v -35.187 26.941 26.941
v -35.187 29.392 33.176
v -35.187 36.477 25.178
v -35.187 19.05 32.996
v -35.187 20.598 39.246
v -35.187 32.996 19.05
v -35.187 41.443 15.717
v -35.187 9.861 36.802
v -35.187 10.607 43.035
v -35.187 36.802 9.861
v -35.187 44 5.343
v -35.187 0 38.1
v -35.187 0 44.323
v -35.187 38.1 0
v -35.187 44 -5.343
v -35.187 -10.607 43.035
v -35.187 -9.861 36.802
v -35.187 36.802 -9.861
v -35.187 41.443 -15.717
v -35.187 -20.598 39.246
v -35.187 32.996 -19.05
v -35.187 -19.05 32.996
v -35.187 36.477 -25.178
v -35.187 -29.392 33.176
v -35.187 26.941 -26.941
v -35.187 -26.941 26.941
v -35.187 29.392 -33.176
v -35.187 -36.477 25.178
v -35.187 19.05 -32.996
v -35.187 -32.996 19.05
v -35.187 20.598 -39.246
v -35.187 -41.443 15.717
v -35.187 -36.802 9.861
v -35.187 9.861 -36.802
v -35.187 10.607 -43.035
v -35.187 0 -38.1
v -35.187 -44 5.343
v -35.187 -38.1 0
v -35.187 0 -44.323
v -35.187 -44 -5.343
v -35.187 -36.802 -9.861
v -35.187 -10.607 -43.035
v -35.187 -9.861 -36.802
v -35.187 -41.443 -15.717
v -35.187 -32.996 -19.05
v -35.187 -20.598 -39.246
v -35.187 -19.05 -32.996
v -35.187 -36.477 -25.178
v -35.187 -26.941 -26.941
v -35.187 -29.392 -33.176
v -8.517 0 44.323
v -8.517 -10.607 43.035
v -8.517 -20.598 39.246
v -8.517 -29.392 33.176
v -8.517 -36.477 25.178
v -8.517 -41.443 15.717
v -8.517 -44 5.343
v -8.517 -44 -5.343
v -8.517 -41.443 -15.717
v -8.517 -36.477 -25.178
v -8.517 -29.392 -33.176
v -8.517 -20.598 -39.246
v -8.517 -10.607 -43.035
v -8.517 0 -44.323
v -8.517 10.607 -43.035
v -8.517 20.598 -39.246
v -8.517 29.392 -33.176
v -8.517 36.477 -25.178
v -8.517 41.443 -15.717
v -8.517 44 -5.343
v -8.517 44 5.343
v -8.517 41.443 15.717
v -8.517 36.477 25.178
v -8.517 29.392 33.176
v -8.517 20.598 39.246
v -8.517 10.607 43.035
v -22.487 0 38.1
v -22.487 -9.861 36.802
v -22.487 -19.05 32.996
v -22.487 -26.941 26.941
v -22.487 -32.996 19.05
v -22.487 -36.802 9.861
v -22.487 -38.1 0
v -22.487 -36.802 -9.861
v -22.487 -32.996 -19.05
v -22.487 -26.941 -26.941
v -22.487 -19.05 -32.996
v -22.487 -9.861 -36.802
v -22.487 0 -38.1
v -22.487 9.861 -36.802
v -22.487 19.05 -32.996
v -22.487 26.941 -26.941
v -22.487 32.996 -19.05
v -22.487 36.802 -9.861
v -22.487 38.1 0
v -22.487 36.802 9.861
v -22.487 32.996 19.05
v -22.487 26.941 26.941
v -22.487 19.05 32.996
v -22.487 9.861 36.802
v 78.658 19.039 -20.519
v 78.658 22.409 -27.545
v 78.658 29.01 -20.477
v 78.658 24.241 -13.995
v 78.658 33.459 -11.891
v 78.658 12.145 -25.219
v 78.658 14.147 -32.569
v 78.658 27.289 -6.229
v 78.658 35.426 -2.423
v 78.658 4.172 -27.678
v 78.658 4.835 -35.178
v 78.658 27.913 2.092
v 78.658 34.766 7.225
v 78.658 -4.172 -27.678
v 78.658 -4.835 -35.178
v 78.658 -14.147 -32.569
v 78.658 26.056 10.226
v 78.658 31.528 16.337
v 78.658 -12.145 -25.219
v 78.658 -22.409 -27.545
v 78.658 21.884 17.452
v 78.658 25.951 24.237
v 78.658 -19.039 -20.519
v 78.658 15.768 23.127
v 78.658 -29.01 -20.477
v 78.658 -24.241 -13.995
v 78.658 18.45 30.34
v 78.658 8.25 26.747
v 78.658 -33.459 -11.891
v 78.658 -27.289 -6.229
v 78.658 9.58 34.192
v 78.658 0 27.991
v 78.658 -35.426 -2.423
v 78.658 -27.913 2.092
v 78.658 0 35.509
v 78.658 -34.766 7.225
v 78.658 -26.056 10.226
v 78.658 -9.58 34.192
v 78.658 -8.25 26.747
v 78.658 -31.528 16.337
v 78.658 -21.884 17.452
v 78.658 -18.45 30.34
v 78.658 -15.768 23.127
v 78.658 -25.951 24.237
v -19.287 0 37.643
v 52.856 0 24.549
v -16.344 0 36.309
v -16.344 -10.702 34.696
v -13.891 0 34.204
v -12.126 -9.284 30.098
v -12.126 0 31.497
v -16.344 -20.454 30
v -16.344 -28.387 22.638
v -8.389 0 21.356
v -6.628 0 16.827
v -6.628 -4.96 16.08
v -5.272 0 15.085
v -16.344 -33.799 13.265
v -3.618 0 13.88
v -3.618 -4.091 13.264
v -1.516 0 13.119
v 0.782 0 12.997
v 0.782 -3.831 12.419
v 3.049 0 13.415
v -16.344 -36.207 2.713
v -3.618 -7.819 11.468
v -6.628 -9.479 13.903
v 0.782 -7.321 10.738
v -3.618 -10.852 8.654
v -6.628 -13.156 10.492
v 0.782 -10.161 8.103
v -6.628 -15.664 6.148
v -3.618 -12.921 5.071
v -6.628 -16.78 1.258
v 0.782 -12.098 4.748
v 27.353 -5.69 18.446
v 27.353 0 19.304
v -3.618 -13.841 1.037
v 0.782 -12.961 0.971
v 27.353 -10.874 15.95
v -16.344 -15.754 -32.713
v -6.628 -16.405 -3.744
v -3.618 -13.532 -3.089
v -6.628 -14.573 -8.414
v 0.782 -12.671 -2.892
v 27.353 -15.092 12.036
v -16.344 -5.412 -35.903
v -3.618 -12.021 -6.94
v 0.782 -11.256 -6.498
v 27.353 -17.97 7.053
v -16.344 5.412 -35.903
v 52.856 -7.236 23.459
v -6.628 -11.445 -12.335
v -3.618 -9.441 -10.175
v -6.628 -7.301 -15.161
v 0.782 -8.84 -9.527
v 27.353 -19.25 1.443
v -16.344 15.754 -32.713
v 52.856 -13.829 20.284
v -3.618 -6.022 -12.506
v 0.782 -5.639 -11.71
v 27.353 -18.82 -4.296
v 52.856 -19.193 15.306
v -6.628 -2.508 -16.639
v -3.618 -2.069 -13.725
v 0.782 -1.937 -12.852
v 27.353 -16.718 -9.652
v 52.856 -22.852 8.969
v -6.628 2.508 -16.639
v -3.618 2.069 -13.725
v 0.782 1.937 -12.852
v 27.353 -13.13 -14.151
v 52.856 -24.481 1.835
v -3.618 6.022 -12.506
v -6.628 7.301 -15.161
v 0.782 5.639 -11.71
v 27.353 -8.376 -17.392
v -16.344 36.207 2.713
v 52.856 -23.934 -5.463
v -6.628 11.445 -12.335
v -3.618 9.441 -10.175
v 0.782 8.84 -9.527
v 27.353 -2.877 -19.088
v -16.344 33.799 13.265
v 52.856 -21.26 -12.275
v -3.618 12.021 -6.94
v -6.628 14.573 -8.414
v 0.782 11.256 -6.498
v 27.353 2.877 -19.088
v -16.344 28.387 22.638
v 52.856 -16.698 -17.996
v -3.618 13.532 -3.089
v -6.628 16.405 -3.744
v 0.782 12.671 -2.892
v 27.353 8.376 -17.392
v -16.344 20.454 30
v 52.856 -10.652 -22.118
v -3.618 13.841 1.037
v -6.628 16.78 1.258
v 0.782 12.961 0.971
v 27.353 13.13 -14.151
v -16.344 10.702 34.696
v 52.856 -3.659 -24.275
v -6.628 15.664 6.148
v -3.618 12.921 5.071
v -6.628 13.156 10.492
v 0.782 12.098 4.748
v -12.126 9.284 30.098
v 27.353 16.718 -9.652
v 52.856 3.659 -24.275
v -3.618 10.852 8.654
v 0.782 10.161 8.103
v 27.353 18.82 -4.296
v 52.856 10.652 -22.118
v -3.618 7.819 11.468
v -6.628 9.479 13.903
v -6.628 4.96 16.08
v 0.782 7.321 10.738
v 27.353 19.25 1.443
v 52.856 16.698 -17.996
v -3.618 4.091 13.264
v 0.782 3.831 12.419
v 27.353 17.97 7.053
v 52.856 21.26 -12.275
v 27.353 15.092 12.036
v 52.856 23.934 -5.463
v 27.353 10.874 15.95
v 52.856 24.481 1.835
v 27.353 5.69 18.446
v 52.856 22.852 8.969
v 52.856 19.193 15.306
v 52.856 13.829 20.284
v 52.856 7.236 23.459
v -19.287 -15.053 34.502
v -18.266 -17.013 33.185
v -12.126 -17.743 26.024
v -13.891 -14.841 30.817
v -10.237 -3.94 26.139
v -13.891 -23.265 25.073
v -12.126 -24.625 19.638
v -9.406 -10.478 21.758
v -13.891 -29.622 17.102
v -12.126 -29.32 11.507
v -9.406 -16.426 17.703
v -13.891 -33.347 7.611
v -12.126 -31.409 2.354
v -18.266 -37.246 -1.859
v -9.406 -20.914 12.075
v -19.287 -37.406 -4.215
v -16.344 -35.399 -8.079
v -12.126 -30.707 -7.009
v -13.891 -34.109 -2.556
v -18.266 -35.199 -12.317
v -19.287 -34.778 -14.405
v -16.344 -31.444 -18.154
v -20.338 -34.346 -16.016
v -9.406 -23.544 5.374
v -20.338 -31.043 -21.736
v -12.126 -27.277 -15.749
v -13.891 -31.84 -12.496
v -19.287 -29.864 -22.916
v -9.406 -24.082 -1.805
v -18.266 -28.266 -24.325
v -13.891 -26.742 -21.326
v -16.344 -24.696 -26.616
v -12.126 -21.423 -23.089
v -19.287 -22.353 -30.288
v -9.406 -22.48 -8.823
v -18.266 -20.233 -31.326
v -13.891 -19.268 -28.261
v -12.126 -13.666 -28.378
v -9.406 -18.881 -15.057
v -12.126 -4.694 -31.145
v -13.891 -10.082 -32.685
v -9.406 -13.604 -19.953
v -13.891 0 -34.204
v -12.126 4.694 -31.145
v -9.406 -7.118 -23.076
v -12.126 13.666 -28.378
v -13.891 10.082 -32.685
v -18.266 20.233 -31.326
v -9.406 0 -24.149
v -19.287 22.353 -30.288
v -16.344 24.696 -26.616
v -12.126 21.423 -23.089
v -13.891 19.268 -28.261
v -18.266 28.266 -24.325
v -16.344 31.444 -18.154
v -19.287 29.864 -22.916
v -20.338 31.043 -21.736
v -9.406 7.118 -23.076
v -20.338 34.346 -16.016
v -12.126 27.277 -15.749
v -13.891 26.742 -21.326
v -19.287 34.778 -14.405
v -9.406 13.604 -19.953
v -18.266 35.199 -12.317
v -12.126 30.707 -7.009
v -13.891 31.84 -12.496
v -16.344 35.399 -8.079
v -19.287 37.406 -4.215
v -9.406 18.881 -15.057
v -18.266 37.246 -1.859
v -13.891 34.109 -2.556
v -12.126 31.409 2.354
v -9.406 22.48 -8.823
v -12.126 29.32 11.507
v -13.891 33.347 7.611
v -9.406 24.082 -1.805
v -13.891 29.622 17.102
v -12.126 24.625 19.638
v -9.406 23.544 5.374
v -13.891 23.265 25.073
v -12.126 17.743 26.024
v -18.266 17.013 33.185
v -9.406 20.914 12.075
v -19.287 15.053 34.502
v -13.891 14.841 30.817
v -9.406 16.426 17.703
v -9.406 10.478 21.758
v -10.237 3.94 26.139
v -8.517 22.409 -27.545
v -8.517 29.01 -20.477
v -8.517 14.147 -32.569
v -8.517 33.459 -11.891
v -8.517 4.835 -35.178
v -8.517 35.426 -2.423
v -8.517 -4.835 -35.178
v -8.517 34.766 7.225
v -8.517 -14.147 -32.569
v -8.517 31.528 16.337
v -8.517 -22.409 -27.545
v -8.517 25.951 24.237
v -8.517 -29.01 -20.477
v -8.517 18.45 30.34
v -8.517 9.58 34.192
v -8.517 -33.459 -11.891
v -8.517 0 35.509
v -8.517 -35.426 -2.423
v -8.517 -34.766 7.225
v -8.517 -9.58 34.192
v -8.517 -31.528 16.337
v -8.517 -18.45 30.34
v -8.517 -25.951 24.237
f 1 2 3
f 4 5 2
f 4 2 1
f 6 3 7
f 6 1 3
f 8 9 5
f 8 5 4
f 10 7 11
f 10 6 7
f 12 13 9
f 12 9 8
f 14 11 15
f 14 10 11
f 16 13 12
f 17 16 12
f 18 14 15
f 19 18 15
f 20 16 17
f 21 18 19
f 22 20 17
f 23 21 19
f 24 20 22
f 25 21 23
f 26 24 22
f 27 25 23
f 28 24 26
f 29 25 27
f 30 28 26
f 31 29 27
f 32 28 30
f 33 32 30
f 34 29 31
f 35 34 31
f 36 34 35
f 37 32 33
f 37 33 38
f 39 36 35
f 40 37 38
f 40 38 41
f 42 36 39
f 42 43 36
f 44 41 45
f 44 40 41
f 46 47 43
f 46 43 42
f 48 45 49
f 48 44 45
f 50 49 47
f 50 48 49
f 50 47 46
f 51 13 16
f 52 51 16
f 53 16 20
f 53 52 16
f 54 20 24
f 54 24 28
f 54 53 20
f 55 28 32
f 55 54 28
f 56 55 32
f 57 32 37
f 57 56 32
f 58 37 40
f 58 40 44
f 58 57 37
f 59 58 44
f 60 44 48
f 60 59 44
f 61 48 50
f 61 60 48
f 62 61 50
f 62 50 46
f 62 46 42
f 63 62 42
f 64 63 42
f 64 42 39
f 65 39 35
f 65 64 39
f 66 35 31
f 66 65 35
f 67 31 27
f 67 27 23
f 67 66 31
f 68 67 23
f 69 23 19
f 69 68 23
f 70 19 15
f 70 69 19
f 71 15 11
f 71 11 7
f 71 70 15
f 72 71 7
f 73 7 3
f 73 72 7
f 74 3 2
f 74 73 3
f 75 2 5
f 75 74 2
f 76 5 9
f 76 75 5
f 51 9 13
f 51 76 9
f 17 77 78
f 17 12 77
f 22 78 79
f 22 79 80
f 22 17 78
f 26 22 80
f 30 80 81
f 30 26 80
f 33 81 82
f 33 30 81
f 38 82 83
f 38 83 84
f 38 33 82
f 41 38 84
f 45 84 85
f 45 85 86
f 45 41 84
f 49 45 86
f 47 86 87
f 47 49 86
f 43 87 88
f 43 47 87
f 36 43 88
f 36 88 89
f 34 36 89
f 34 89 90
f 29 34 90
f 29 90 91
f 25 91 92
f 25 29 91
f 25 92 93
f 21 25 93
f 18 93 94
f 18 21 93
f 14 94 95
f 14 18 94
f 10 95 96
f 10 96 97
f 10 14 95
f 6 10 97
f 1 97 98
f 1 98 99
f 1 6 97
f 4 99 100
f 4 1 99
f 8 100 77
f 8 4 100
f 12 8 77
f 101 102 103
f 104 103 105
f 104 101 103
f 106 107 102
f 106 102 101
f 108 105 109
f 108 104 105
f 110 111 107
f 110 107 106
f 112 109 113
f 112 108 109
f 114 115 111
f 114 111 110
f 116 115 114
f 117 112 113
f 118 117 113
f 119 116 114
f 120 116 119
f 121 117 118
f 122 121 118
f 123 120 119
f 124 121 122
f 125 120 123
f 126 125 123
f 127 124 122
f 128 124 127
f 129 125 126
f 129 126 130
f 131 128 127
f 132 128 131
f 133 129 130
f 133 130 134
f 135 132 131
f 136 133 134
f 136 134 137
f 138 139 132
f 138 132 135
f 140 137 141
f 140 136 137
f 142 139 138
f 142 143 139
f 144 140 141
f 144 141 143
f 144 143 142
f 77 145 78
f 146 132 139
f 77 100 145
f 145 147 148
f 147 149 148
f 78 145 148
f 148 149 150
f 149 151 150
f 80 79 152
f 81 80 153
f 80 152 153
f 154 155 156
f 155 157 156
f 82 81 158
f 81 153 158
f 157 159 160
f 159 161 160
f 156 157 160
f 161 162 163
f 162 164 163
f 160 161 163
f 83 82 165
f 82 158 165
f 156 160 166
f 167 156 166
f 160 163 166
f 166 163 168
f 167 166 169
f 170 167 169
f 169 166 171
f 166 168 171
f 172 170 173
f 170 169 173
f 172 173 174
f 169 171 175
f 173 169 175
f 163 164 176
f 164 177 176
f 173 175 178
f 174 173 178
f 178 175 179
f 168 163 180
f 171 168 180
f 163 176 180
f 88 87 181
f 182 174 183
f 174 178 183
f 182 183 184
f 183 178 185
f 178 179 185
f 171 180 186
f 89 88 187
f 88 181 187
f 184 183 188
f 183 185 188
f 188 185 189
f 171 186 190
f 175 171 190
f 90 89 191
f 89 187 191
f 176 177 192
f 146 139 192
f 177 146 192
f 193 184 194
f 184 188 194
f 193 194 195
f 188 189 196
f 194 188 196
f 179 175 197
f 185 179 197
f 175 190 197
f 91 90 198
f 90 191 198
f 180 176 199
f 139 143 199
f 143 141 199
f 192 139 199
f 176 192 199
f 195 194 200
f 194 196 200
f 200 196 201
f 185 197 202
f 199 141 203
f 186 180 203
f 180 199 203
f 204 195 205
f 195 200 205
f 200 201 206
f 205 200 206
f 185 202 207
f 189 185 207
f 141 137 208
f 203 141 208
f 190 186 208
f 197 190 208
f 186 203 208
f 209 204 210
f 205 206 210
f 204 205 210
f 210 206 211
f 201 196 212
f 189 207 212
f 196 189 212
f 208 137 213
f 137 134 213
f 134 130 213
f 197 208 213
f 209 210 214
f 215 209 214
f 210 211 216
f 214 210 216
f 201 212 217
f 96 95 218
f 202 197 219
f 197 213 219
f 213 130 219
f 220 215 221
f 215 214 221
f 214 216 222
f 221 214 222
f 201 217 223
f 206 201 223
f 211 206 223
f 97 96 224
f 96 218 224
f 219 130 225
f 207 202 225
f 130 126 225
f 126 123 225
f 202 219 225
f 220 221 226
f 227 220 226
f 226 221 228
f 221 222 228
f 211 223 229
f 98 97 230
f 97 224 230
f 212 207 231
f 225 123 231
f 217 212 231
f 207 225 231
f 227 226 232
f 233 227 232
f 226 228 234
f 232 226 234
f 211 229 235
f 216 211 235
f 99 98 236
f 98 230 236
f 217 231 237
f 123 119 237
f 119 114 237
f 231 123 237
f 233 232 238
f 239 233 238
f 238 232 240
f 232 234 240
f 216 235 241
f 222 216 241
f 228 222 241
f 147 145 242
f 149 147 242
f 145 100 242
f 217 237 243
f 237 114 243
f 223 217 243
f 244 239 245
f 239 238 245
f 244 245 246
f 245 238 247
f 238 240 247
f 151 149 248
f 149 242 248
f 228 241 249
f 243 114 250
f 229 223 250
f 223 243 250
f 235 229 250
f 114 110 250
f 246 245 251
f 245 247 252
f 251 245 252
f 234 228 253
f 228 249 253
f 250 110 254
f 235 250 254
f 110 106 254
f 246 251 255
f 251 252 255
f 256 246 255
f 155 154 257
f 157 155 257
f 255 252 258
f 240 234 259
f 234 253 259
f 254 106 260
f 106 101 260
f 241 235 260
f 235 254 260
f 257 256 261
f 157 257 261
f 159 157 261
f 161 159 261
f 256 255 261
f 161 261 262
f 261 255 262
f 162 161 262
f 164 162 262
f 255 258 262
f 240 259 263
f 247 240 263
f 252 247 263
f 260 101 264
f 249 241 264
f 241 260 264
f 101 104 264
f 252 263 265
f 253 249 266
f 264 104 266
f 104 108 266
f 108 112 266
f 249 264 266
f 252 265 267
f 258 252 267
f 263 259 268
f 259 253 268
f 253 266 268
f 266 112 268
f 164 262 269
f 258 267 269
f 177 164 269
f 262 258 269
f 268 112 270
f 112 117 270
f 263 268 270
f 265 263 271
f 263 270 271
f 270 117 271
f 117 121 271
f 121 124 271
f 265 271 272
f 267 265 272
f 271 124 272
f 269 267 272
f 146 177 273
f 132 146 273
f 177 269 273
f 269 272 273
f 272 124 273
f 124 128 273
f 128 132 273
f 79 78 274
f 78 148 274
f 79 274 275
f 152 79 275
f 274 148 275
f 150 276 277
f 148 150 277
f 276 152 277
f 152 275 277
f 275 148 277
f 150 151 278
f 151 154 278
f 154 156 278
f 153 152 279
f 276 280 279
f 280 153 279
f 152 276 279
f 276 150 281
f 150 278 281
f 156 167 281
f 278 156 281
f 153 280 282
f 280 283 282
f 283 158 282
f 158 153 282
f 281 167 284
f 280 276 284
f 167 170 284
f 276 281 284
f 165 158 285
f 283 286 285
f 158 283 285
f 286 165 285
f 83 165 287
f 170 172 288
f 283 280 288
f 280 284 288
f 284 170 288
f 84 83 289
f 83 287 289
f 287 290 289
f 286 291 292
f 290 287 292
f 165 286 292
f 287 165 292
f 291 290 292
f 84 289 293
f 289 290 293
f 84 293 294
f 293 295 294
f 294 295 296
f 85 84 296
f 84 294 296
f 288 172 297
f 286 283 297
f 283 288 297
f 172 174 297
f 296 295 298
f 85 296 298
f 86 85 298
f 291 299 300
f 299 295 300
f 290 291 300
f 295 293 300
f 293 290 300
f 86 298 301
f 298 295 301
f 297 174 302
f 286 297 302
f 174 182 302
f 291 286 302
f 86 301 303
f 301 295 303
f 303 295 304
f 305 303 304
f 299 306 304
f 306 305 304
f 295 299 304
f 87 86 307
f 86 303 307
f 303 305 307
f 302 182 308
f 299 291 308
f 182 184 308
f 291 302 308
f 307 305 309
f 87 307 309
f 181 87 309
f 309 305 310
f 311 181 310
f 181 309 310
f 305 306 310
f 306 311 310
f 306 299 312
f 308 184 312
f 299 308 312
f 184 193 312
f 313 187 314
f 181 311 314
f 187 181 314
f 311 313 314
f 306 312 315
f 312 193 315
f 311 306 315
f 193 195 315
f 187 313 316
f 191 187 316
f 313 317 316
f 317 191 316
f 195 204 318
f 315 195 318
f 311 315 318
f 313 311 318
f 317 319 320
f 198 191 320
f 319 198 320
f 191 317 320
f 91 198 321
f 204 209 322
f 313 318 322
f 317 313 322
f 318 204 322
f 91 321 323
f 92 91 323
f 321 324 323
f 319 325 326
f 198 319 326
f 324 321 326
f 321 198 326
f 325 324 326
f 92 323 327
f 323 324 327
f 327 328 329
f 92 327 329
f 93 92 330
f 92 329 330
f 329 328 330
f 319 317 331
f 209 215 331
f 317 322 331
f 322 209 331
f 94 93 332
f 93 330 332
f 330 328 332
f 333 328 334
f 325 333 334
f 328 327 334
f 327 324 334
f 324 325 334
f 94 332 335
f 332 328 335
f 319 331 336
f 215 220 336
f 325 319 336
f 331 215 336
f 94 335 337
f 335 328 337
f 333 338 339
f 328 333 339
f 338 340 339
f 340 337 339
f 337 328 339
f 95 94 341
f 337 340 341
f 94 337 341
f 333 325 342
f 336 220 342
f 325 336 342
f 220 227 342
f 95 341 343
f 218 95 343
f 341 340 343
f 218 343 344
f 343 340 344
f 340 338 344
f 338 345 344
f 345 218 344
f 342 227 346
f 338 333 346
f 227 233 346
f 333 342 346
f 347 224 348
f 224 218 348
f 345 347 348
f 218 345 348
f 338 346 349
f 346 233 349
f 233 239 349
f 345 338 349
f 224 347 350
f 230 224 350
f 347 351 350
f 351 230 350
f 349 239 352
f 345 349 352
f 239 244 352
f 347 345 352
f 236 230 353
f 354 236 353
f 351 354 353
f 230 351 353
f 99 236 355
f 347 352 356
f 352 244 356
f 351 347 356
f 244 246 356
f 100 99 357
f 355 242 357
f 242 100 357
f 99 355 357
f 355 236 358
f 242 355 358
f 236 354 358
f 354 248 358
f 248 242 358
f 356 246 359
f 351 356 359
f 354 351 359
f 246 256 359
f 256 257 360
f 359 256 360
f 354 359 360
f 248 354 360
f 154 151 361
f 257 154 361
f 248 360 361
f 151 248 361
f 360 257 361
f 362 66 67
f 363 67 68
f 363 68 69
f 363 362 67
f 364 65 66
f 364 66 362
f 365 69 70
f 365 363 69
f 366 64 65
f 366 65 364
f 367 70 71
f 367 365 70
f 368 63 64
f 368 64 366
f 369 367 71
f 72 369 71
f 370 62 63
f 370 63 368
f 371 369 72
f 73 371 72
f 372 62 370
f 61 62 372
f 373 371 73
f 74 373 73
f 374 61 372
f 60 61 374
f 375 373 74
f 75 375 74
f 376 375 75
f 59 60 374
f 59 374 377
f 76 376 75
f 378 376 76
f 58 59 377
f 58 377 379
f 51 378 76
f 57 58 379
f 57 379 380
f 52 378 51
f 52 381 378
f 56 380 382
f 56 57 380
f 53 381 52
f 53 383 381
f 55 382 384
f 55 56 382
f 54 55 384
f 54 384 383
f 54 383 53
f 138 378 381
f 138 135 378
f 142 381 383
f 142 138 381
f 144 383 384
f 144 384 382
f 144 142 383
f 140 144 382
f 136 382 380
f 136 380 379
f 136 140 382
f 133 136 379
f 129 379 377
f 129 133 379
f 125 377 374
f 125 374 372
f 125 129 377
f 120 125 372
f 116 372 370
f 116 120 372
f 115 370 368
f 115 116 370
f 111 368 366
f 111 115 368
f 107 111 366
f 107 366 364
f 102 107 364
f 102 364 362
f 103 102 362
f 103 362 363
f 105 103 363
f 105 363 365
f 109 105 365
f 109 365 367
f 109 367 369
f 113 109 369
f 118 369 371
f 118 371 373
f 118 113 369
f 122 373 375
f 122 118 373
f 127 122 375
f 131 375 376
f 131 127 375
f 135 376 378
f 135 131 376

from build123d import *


with BuildPart() as part:
    # Sketch1 → Revolve1 (revolve)
    with BuildSketch(Plane.XY, mode=Mode.PRIVATE) as revolve1_sk:
        with BuildLine():
            Line((-22.48672668, 38.1), (-35.18672668, 38.1))
            Line((-35.18672668, 38.1), (-35.18672668, 44.323))
            Line((-35.18672668, 44.323), (-8.51672668, 44.323))
            Line((-8.51672668, 44.323), (-8.51672668, 35.5092))
            Line((-8.51672668, 35.5092), (78.657926453, 35.5092))
            Line((78.657926453, 35.5092), (78.657926453, 27.9908))
            add(Edge.make_bspline(
                [(-22.48672668, 38.1), (-22.370356861, 38.09897388), (-22.137617212, 38.096921641), (-21.78883339, 38.080327111), (-21.440700568, 38.053854343), (-21.093543503, 38.016557388), (-20.74768602, 37.968731147), (-20.403450755, 37.91035045), (-20.061158792, 37.841488555), (-19.721129451, 37.762204619), (-19.383679924, 37.672573912), (-19.049124958, 37.57267979), (-18.717776663, 37.462615419), (-18.389944097, 37.342483534), (-18.065933107, 37.212396112), (-17.746045893, 37.072474607), (-17.430580883, 36.922849446), (-17.11983234, 36.763660254), (-16.814090128, 36.595055503), (-16.513639459, 36.417192477), (-16.218760597, 36.230237084), (-15.929728606, 36.034363742), (-15.646813104, 35.829755152), (-15.370277996, 35.616602171), (-15.100381265, 35.395103606), (-14.837374632, 35.165466125), (-14.581503429, 34.927903948), (-14.333006388, 34.682638616), (-14.092115305, 34.429898936), (-13.859054833, 34.16992072), (-13.634042456, 33.902946399), (-13.417287983, 33.629225095), (-13.208993675, 33.349012066), (-13.009353819, 33.06256874), (-12.818554487, 32.770162339), (-12.63677442, 32.472065382), (-12.46418014, 32.168557049), (-12.300944211, 31.859916207), (-12.147175782, 31.546446579), (-12.003178938, 31.228381675), (-11.868488722, 30.906237874), (-11.707728514, 30.479262811), (-11.51732689, 29.949147874), (-11.287330166, 29.319466301), (-11.058243338, 28.689458089), (-10.828912694, 28.0595374), (-10.599647364, 27.429593267), (-10.370364598, 26.799655394), (-10.141086446, 26.169715856), (-9.911807079, 25.539776759), (-9.682528012, 24.909837557), (-9.453248915, 24.279898367), (-9.223969775, 23.649959192), (-8.994690752, 23.020019971), (-8.765411249, 22.390080926), (-8.536133555, 21.760141234), (-8.306849289, 21.130203891), (-8.077589317, 20.500257863), (-7.848238738, 19.870344215), (-7.619226341, 19.240309716), (-7.388951901, 18.610726192), (-7.203772618, 18.0924821), (-7.050725438, 17.690209546), (-6.926500885, 17.405737457), (-6.791372669, 17.126326499), (-6.644826713, 16.852710937), (-6.487303844, 16.585271882), (-6.319012214, 16.324472291), (-6.140245146, 16.070739401), (-5.951295216, 15.824495391), (-5.752476857, 15.586148163), (-5.544119378, 15.356093132), (-5.326568454, 15.134711683), (-5.100184794, 14.92237094), (-4.865343728, 14.719423101), (-4.622434808, 14.526204554), (-4.371860704, 14.343035849), (-4.114037025, 14.170220608), (-3.849391254, 14.008045488), (-3.57836228, 13.856779357), (-3.301399487, 13.71667311), (-3.018962187, 13.587958994), (-2.731518701, 13.470850518), (-2.4395457, 13.365541833), (-2.143527323, 13.272207607), (-1.84395447, 13.191002668), (-1.541323896, 13.122061095), (-1.236137392, 13.065499653), (-0.9289012, 13.02140299), (-0.620124168, 12.989878407), (-0.310320711, 12.970850368), (-0.020680283, 12.965229082), (0.248254878, 12.968772306), (0.496363247, 12.977806365), (0.744174099, 12.992980091), (0.991540862, 13.014182722), (1.238316013, 13.041426715), (1.484350236, 13.074696966), (1.729504434, 13.113944035), (1.973603072, 13.159261448), (2.216609324, 13.210183939), (2.741108155, 13.336511416), (3.546225146, 13.540917433), (4.635103679, 13.810886776), (5.723582618, 14.08216045), (6.812168643, 14.352667031), (7.900726018, 14.622873913), (8.989291105, 14.892568408), (10.077854183, 15.161719913), (11.166417874, 15.430249095), (12.254981464, 15.698089726), (13.343545159, 15.96517198), (14.432108907, 16.23142704), (15.520672729, 16.49678579), (16.609236611, 16.761179295), (17.697800593, 17.024538387), (18.786364665, 17.286794115), (19.874928833, 17.547877422), (20.963493102, 17.807719276), (22.052057473, 18.066250654), (23.140621957, 18.323402462), (24.229186548, 18.579105746), (25.317751275, 18.833291384), (26.406316136, 19.085890404), (27.494881125, 19.336833785), (28.583446277, 19.586052369), (29.672011553, 19.833477309), (30.760576999, 20.079039368), (31.849142586, 20.322669685), (32.93770836, 20.564299058), (34.026274304, 20.803858594), (35.114840433, 21.041279179), (36.203406751, 21.276491794), (37.291973258, 21.509427416), (38.38053997, 21.740016935), (39.469106873, 21.968191446), (40.557674, 22.193881789), (41.646241362, 22.417018943), (42.73480894, 22.637533965), (43.823376761, 22.855357718), (44.911944827, 23.070421178), (46.000513128, 23.282655353), (47.089081692, 23.491991155), (48.177650515, 23.698359593), (49.266219622, 23.901691587), (50.354789007, 24.101918108), (51.443358679, 24.298970117), (52.531928645, 24.492778575), (53.620498905, 24.683274445), (54.709069477, 24.870388679), (55.797640354, 25.054052306), (56.886211583, 25.234196124), (57.974783131, 25.410751265), (59.063355022, 25.583648611), (60.151927263, 25.752819113), (61.240499857, 25.918193698), (62.329072801, 26.079703464), (63.417646132, 26.237279179), (64.506219844, 26.390851938), (65.594793944, 26.540352674), (66.683368441, 26.685712313), (67.771943341, 26.826861819), (68.860518645, 26.963732162), (69.949094372, 27.096254247), (71.037670511, 27.224359253), (72.126247141, 27.34797742), (73.214824057, 27.467042076), (74.303402002, 27.581475559), (75.391978236, 27.691241067), (76.480563035, 27.796148979), (77.569118074, 27.896580053), (78.295038811, 27.959397546), (78.657926453, 27.9908)],
                knots=[0, 0, 0, 0, 0.002987351, 0.005974702, 0.008962053, 0.011949404, 0.014936754, 0.017924105, 0.020911456, 0.023898807, 0.026886158, 0.029873509, 0.03286086, 0.035848211, 0.038835562, 0.041822913, 0.044810263, 0.047797614, 0.050784965, 0.053772316, 0.056759667, 0.059747018, 0.062734369, 0.06572172, 0.068709071, 0.071696422, 0.074683773, 0.077671124, 0.080658475, 0.083645825, 0.086633176, 0.089620527, 0.092607878, 0.095595229, 0.09858258, 0.101569931, 0.104557282, 0.107544633, 0.110531983, 0.113519334, 0.116506685, 0.119494036, 0.125230633, 0.130967229, 0.136703825, 0.142440421, 0.148177017, 0.153913614, 0.15965021, 0.165386806, 0.171123402, 0.176859998, 0.182596595, 0.188333191, 0.194069787, 0.199806383, 0.20554298, 0.211279576, 0.217016172, 0.222752768, 0.228489365, 0.234225961, 0.236881304, 0.239536646, 0.242191989, 0.244847332, 0.247502675, 0.250158017, 0.25281336, 0.255468703, 0.258124046, 0.260779388, 0.263434731, 0.266090074, 0.268745417, 0.271400759, 0.274056102, 0.276711445, 0.279366788, 0.28202213, 0.284677473, 0.287332816, 0.289988159, 0.292643501, 0.295298844, 0.297954187, 0.30060953, 0.303264872, 0.305920215, 0.308575558, 0.311230901, 0.313886243, 0.316010611, 0.31813498, 0.320259348, 0.322383716, 0.324508084, 0.326632452, 0.32875682, 0.330881188, 0.333005557, 0.335129925, 0.344730434, 0.354330518, 0.363930033, 0.373528837, 0.38312679, 0.392723749, 0.402319575, 0.411914129, 0.421507273, 0.431098868, 0.440688779, 0.45027687, 0.459863008, 0.469447062, 0.479028899, 0.488608391, 0.498185412, 0.507759834, 0.517331536, 0.526900396, 0.536466294, 0.546029114, 0.555588741, 0.565145064, 0.574697973, 0.584247361, 0.593793126, 0.603335165, 0.612873382, 0.622407682, 0.631937973, 0.641464168, 0.650986183, 0.660503936, 0.670017352, 0.679526355, 0.689030879, 0.698530857, 0.708026229, 0.717516937, 0.727002931, 0.736484163, 0.745960589, 0.755432172, 0.764898879, 0.774360681, 0.783817556, 0.793269485, 0.802716458, 0.812158466, 0.82159551, 0.831027593, 0.840454726, 0.849876926, 0.859294215, 0.868706623, 0.878114185, 0.887516943, 0.896914946, 0.906308248, 0.915696912, 0.925081007, 0.934460609, 0.943835802, 0.953206678, 0.962573334, 0.971935876, 0.981294419, 0.990649083, 1, 1, 1, 1], degree=3))
        make_face()
    revolve(revolve1_sk.sketch.rotate(Axis((-35.18672668, 0, 0), (1, 0, 0)), 90), axis=Axis((-35.18672668, 0, 0), (1, 0, 0)))


solid = part.part
